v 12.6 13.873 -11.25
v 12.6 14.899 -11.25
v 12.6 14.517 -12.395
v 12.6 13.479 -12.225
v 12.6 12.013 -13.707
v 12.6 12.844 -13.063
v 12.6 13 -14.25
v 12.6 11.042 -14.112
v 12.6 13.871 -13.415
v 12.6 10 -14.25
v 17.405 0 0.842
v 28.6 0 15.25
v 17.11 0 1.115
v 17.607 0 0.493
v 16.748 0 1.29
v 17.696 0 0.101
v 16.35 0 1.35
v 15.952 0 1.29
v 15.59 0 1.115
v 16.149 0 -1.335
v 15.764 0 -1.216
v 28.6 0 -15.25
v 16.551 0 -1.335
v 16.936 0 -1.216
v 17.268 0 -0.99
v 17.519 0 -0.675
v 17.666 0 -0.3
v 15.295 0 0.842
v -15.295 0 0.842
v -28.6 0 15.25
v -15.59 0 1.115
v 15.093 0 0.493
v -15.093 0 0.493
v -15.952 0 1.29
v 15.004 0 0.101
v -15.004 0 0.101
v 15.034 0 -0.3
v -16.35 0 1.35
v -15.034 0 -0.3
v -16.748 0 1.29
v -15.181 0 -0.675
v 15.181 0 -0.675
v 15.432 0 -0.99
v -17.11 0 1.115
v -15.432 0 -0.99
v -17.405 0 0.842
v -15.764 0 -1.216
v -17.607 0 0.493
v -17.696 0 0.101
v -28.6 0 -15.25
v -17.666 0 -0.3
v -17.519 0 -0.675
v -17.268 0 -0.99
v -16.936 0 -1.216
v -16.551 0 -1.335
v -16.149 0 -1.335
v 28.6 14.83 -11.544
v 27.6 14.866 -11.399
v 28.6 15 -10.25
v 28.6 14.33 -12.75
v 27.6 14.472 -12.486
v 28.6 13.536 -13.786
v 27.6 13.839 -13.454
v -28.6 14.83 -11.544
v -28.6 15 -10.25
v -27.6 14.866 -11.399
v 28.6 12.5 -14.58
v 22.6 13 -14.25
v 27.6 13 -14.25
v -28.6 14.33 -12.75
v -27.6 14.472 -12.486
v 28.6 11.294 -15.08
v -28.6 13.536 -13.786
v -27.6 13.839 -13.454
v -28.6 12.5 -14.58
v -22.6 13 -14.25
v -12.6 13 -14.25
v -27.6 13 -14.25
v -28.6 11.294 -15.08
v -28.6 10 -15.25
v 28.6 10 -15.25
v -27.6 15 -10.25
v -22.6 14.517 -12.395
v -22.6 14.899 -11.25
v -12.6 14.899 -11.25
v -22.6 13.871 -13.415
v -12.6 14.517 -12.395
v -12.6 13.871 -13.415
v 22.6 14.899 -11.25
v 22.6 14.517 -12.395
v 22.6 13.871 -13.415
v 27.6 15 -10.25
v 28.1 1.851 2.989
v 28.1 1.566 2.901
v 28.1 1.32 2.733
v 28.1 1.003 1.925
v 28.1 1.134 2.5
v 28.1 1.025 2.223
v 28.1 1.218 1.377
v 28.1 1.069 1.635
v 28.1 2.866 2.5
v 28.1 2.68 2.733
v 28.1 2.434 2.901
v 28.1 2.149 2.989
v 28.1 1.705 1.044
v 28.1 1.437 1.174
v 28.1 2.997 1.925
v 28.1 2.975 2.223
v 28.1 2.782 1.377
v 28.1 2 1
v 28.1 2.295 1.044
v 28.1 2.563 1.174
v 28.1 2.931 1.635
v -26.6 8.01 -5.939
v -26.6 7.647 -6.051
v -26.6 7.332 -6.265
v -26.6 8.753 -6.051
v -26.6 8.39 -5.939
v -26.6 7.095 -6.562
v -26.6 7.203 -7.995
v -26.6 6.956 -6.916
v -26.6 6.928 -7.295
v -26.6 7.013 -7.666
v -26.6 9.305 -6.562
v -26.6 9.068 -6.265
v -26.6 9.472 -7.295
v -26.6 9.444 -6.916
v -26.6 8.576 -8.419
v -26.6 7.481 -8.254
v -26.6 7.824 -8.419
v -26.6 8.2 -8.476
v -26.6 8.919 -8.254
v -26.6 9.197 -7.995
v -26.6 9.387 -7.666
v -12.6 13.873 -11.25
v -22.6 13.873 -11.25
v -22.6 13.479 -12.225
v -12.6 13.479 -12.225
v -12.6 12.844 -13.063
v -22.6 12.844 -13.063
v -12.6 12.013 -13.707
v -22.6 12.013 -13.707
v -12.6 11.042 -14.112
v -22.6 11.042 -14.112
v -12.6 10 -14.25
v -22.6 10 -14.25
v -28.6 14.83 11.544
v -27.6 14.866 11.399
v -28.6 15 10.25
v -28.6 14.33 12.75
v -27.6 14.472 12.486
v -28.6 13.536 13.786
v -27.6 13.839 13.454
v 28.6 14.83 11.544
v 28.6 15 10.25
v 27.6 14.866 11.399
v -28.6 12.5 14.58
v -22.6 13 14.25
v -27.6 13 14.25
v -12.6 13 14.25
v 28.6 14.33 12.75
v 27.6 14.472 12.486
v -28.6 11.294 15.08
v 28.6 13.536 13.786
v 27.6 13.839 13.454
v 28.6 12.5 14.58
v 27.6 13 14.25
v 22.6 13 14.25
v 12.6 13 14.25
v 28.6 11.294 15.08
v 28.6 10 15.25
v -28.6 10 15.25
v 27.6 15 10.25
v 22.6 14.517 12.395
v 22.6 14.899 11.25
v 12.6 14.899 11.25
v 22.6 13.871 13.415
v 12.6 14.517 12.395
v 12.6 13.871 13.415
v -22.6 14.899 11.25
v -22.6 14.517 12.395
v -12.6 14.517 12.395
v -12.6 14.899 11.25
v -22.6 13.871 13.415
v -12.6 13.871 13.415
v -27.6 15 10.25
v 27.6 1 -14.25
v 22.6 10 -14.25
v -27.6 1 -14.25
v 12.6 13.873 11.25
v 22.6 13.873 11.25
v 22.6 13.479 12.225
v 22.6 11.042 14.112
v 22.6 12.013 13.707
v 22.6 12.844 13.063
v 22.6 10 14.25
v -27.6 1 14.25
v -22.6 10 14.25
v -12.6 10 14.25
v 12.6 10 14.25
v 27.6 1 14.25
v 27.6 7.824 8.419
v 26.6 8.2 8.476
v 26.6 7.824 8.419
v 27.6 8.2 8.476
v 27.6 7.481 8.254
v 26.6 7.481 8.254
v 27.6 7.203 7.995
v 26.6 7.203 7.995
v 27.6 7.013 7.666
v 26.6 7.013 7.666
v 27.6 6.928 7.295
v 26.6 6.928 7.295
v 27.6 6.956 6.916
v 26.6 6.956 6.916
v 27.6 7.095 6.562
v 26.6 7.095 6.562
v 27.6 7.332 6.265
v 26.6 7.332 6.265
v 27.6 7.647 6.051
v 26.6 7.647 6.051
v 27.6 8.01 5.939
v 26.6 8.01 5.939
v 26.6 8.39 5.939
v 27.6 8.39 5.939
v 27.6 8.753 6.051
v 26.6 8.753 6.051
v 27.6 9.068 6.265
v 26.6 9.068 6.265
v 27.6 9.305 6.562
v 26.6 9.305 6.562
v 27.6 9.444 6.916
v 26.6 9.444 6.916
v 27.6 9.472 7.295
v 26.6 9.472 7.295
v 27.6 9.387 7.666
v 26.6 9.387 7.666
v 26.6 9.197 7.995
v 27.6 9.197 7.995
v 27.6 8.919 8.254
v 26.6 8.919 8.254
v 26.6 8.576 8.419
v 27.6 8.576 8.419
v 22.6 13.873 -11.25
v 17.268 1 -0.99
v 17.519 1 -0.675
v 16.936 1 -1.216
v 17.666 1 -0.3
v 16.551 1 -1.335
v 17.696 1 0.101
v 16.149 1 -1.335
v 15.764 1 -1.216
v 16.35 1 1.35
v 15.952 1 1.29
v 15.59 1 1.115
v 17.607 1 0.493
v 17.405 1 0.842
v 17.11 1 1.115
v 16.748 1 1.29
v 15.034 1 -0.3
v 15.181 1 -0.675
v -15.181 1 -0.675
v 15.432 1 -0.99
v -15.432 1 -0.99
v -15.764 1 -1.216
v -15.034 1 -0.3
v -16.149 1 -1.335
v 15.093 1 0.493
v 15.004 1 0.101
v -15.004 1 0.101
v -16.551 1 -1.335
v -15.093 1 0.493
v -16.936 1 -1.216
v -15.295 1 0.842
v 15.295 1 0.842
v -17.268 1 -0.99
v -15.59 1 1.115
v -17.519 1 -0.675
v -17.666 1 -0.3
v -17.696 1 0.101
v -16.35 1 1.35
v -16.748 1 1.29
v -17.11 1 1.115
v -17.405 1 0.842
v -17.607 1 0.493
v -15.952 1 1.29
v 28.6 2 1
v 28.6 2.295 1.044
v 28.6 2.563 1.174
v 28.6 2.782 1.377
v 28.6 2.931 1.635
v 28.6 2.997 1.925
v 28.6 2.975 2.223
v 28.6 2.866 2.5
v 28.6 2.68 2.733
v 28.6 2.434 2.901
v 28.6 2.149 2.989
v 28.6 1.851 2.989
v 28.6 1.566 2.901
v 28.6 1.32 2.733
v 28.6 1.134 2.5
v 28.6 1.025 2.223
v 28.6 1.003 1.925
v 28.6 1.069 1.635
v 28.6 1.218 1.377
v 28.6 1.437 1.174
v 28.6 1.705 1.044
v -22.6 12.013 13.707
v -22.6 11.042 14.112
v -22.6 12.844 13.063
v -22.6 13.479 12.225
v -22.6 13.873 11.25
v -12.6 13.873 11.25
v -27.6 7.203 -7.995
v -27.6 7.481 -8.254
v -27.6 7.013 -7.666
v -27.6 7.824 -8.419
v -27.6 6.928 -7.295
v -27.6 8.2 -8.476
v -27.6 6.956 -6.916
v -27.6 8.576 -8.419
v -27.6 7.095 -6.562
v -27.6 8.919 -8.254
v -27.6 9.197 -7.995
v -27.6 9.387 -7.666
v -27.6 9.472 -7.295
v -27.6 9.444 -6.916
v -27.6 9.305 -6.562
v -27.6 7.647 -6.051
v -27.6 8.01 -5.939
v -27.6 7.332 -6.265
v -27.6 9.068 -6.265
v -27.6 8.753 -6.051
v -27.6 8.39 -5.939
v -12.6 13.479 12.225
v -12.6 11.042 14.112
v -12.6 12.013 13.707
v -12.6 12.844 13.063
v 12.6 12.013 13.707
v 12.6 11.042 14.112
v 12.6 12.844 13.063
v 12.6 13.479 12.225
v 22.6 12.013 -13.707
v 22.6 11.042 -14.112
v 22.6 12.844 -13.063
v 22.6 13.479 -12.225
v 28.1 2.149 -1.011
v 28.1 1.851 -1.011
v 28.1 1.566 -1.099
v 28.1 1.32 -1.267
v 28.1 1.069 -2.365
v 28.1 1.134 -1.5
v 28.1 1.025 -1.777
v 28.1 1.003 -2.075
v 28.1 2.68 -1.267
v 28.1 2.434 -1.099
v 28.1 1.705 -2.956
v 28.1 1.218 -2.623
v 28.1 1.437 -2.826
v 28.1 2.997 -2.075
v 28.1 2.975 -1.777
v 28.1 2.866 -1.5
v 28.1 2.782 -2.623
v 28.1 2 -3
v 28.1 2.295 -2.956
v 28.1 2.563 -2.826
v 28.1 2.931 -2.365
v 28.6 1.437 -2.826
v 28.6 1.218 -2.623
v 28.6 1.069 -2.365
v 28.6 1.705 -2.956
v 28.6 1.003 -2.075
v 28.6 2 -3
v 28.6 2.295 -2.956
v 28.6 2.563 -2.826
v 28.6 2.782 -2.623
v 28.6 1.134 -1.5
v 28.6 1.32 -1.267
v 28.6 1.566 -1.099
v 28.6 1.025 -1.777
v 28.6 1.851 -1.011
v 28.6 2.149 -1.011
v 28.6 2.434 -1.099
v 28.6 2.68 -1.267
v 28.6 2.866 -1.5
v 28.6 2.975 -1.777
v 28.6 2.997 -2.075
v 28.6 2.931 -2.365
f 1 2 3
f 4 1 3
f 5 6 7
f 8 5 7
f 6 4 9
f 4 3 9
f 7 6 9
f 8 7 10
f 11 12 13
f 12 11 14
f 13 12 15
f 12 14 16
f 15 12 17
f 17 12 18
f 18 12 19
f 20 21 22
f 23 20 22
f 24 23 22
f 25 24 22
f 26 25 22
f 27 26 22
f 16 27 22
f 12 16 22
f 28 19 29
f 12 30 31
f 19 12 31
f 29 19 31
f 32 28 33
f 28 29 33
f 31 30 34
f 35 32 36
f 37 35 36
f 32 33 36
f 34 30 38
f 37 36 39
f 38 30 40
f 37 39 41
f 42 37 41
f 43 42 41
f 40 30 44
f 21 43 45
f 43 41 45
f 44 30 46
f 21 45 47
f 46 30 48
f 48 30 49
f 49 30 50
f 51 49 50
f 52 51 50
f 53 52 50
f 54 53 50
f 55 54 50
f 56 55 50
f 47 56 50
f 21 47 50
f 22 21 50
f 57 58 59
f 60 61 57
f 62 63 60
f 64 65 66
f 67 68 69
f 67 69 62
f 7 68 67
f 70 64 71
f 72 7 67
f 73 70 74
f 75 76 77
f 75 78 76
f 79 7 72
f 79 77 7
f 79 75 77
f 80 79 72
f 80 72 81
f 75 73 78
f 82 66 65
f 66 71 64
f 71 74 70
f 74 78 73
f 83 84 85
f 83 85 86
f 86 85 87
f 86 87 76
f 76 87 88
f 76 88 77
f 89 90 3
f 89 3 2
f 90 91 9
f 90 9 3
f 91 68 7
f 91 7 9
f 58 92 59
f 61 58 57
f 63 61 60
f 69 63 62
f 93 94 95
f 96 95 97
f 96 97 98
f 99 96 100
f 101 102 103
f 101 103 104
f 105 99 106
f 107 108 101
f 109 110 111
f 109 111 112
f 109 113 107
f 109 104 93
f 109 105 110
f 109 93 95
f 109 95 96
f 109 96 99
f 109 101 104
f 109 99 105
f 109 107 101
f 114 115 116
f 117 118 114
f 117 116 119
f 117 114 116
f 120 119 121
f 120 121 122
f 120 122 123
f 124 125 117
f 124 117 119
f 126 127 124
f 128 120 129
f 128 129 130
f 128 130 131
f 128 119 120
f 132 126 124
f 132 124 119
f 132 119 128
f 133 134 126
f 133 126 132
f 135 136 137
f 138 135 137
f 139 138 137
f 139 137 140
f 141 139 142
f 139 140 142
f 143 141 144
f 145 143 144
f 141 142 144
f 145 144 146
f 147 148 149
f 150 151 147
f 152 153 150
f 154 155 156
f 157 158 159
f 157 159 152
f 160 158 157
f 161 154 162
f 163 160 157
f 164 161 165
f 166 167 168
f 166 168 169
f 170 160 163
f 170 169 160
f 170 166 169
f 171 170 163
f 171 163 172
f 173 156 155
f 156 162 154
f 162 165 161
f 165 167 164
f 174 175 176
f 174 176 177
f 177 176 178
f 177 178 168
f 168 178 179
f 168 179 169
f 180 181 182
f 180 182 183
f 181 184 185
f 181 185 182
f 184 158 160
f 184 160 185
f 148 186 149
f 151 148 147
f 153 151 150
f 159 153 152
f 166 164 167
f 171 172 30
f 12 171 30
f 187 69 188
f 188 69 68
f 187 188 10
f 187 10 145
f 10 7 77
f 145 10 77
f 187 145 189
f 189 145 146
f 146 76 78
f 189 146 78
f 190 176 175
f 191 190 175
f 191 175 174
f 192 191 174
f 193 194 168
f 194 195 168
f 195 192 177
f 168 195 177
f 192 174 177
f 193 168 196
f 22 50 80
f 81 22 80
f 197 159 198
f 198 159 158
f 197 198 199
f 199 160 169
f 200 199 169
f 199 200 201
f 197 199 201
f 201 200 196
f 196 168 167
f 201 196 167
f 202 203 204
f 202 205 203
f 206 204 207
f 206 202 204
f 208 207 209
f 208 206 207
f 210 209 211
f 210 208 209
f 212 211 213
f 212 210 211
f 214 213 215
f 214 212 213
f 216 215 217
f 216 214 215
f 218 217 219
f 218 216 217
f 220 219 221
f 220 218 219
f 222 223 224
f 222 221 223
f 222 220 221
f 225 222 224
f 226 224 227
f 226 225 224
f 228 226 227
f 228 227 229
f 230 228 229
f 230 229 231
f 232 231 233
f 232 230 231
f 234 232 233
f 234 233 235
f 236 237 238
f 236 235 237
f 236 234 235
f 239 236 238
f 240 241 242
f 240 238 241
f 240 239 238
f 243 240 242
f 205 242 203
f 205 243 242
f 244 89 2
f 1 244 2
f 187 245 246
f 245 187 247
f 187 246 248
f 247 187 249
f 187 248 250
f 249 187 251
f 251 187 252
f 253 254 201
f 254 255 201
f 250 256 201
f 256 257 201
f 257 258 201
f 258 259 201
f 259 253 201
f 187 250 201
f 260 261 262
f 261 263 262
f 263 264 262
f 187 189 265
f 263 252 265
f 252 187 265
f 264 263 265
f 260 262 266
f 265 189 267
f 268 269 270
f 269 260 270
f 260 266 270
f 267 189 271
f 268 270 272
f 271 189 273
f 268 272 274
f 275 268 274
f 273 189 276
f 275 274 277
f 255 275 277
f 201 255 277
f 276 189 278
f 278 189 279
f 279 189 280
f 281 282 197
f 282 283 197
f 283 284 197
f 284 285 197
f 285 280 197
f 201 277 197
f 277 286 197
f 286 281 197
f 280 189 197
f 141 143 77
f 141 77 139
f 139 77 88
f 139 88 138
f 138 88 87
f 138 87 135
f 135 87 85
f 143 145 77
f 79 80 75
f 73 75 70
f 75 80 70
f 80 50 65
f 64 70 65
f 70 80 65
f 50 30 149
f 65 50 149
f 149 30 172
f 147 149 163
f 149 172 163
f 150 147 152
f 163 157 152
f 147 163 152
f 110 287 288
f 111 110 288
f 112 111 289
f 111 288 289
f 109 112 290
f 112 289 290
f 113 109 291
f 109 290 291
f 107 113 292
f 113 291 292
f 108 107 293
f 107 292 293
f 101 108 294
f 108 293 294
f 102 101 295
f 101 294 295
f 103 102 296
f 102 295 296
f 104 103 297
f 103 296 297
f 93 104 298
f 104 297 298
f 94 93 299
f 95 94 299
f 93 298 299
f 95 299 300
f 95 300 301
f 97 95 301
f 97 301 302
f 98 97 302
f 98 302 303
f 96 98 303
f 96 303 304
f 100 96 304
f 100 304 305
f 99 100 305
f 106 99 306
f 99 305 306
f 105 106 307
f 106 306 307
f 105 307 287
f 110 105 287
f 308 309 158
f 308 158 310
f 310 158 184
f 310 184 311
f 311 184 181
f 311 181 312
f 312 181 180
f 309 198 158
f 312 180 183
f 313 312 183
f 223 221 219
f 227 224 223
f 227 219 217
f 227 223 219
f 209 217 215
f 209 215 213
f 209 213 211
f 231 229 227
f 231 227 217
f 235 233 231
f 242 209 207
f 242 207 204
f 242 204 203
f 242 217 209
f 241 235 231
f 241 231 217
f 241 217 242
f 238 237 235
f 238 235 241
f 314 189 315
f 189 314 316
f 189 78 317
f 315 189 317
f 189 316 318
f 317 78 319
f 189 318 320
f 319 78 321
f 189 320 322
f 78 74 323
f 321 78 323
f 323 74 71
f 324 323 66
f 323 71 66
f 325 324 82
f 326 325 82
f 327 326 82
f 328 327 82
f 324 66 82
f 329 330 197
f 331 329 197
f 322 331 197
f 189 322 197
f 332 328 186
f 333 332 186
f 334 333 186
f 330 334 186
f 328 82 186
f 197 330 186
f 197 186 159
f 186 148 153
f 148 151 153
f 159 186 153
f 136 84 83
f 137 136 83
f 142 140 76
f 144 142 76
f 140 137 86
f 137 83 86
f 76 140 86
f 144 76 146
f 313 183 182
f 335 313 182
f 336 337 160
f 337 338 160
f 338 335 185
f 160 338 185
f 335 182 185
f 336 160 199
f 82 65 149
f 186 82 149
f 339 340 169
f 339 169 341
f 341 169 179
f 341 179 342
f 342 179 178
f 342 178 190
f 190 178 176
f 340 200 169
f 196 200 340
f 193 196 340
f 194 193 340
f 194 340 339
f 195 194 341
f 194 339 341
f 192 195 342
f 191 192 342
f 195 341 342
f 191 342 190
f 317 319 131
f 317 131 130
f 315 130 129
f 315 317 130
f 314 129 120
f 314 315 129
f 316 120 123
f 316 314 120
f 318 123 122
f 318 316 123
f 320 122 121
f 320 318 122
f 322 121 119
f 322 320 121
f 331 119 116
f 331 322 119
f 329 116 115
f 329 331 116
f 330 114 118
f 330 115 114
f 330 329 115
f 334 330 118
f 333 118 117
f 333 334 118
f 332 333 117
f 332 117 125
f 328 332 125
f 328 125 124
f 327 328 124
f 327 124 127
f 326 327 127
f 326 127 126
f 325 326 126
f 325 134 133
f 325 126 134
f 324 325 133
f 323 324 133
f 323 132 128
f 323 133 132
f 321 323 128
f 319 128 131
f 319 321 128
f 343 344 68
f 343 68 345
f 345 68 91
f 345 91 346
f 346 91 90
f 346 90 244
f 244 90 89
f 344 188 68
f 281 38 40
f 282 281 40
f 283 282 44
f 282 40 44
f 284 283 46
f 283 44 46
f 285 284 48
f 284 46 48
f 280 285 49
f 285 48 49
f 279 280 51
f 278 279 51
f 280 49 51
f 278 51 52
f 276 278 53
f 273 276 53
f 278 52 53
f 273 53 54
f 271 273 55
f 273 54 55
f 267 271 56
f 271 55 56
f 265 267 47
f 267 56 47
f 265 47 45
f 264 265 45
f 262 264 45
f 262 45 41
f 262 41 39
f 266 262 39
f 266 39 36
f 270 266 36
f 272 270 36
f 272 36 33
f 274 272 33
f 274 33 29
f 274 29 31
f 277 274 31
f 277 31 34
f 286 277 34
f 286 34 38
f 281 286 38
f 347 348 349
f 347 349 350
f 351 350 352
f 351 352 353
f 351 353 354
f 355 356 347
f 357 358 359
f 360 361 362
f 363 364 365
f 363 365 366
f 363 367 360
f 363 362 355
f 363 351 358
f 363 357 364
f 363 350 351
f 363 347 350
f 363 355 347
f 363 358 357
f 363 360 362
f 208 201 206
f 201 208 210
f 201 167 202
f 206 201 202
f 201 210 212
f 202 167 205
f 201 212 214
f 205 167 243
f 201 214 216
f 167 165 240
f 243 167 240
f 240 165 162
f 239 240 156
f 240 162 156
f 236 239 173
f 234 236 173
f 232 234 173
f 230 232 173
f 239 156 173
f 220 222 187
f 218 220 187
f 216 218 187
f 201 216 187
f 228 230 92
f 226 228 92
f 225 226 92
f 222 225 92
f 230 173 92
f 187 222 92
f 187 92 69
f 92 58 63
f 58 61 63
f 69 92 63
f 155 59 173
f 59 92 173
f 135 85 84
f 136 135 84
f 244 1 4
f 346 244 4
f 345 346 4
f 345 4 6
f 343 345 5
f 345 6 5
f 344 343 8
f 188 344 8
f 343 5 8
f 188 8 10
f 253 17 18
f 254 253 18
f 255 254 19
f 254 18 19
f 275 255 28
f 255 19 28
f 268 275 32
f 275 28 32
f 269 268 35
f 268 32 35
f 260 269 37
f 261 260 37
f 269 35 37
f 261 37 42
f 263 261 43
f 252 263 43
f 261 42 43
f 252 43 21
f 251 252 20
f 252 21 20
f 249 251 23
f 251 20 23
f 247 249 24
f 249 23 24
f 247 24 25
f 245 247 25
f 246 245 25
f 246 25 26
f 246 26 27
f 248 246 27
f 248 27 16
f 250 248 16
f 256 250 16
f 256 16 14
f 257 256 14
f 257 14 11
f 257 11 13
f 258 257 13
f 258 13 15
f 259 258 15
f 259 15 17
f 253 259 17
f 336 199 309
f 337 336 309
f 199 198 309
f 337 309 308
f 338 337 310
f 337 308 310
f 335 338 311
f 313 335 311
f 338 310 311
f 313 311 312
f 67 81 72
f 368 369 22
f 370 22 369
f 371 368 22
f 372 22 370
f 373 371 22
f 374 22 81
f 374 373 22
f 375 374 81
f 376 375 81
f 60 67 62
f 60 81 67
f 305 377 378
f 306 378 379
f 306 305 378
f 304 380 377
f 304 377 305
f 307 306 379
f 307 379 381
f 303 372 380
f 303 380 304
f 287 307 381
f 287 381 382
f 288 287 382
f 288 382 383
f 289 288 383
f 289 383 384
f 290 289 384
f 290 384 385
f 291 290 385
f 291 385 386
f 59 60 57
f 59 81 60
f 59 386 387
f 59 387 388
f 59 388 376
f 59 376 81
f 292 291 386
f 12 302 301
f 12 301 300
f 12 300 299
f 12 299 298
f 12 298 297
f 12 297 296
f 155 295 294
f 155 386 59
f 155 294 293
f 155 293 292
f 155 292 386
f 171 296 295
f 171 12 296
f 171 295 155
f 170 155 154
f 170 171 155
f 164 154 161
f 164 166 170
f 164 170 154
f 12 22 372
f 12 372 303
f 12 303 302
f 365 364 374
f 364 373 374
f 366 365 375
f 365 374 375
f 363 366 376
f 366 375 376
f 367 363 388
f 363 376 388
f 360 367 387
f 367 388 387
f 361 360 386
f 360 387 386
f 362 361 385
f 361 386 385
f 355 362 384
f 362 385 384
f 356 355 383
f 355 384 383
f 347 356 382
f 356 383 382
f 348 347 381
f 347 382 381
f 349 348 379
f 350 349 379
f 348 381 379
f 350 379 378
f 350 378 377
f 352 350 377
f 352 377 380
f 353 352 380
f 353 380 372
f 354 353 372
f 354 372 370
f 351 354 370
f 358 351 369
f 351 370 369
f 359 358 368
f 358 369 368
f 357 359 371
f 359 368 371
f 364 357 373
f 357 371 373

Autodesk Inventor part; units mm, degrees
ref_plane "YZ Plane" through (0, 0, 0) normal (1, 0, 0) x (0, 1, 0)
ref_plane "XZ Plane" through (0, 0, 0) normal (0, 1, 0) x (-1, 0, 0)
ref_plane "XY Plane" through (0, 0, 0) normal (0, 0, 1) x (1, 0, 0)
sketch "Sketch1" plane through (0, 0, 0) normal (1, 0, 0) x (0, 1, 0)
  line L0 (15, 15.25) -> (0, 15.25)
  line L1 (0, 15.25) -> (0, -15.25)
  line L2 (0, -15.25) -> (15, -15.25)
  line L3 (15, -15.25) -> (15, 15.25)
  line L4 (15, 15.25) -> (0, -15.25) construction
  line L5 (0, 15.25) -> (15, -15.25) construction
  point P0 (0, 0)
  point P1 (7.5, 0)
  dimension "d0" = 15
  dimension "d1" = 30.5
  dimension "d2" = 0
  dimension "d3" = 0
extrude "Extrusion1" add sketch "Sketch1" along normal mid plane 57.2
fillet "Fillet1" radius 5 2 edges at (0, 15, 15.25) (0, 15, -15.25)
sketch "Sketch2" plane through (0, 0, 0) normal (1, 0, 0) x (0, 1, 0)
  arc A0 (10, -15.25) -> (15, -10.25) centre (10, -10.25) ccw projected
  line L0 (15, -10.25) -> (15, 10.25) projected
  arc A1 (15, 10.25) -> (10, 15.25) centre (10, 10.25) ccw projected
  line L1 (10, 15.25) -> (0, 15.25) projected
  line L2 (0, 15.25) -> (0, -15.25) projected
  line L3 (0, -15.25) -> (10, -15.25) projected
  line L4 (1, 14.25) -> (10, 14.25)
  arc A2 (14, 10.25) -> (10, 14.25) centre (10, 10.25) ccw
  line L5 (14, 10.25) -> (14, -10.25)
  arc A3 (10, -14.25) -> (14, -10.25) centre (10, -10.25) ccw
  line L6 (10, -14.25) -> (1, -14.25)
  line L7 (1, -14.25) -> (1, 14.25)
  point P0 (0, 0)
  dimension "d7" = 1
extrude "Extrusion2" cut sketch "Sketch2" along normal mid plane 55.2 contours L4 A2 L5 A3 L6 L7
sketch "Sketch3" plane through (-28.6, 15, -10.25) normal (0, 1, 0) x (1, 0, 0)
  line L0 (0, -20.5) -> (0, 0) construction
  line L1 (57.2, -20.5) -> (0, -20.5) construction
  line L2 (57.2, 0) -> (57.2, -20.5) construction
  line L3 (1, 4) -> (1, -24.5)
  line L4 (1, -24.5) -> (6, -24.5)
  line L5 (6, -24.5) -> (6, -21.5)
  line L6 (6, -21.5) -> (16, -21.5)
  line L7 (16, -21.5) -> (16, -24.5)
  line L8 (16, -24.5) -> (41.2, -24.5)
  line L9 (41.2, -24.5) -> (41.2, -21.5)
  line L10 (41.2, -21.5) -> (51.2, -21.5)
  line L11 (51.2, -21.5) -> (51.2, -24.5)
  line L12 (51.2, -24.5) -> (56.2, -24.5)
  line L13 (56.2, -24.5) -> (56.2, 4)
  line L14 (56.2, 4) -> (51.2, 4)
  line L15 (51.2, 4) -> (51.2, 1)
  line L16 (51.2, 1) -> (41.2, 1)
  line L17 (41.2, 1) -> (41.2, 4)
  line L18 (41.2, 4) -> (16, 4)
  line L19 (16, 4) -> (16, 1)
  line L20 (16, 1) -> (6, 1)
  line L21 (6, 1) -> (6, 4)
  line L22 (6, 4) -> (1, 4)
  line L23 (57.2, 5) -> (0, 5) projected
  line L24 (0, -25.5) -> (57.2, -25.5) projected
  point P0 (28.6, -10.25)
  dimension "d10" = 1
  dimension "d11" = 1
  dimension "d12" = 1
  dimension "d13" = 1
  dimension "d14" = 10
  dimension "d15" = 5
  dimension "d16" = 3
extrude "Extrusion3" cut sketch "Sketch3" against normal up to next
sketch "Sketch4" plane through (-27.6, 1, 14.25) normal (0, 1, 0) x (1, 0, 0)
  line L0 (0, 0) -> (55.2, 0) projected
  line L1 (55.2, 28.5) -> (0, 28.5) projected
  point P0 (27.6, 14.25)
  point P1 (11.25, 14.25)
  point P2 (43.95, 14.25)
  dimension "d19" = 32.7
  dimension "d20" = 16.35
  dimension "d21" = 14.25
  dimension "d22" = 14.25
  dimension "d23" = 14.25
hole "Hole1" at (-16.35, 1, 0) at (16.35, 1, 0) direction (0, -1, 0) diameter 2.7 end through all
sketch "Sketch5" plane through (-27.6, 0, 0) normal (1, 0, 0) x (0, 0, -1)
  line L0 (14.25, 1) -> (-14.25, 1) projected
  line L1 (-10.25, 15) -> (10.25, 15) projected
  circle A0 centre (7.2, 8.2) radius 1.2755
  line L2 (0, 0) -> (0, 12.8621) construction
  dimension "d31" = 7.2
  dimension "d32" = 7.2
extrude "Extrusion4" add sketch "Sketch5" along normal blind 1
pattern_circular "Circular Pattern1" count 2 over 360 about axis through (0, -10, 0) along (0, 1, 0) of "Extrusion4"
sketch "Sketch6" plane through (28.6, 0, 0) normal (1, 0, 0) x (0, 0, -1)
  circle A0 centre (-2, 2) radius 1
  circle A1 centre (2, 2) radius 1
  line L0 (-14.25, 1) -> (14.25, 1) projected
  point P0 (0, 0)
  dimension "d38" = 2
  dimension "d39" = 2
  dimension "d40" = 2
  dimension "d41" = 2
extrude "Extrusion5" cut sketch "Sketch6" against normal blind 0.5
sketch "Sketch7" plane through (28.6, 0, 0) normal (1, 0, 0) x (0, 0, -1)
  circle A0 centre (2, 2) radius 1 projected
sketch "Sketch8" plane through (28.6, 0, 0) normal (1, 0, 0) x (0, 0, -1)
  circle A0 centre (-2, 2) radius 1 projected
equation "\"d13\" = d12"
equation "\"d20\" = 0.5 * d19"
equation "\"d21\" = d22"
equation "\"d23\" = d21"
equation "\"d32\" = d31"
properties part number "AAHolder" material "ABS Plastic"
